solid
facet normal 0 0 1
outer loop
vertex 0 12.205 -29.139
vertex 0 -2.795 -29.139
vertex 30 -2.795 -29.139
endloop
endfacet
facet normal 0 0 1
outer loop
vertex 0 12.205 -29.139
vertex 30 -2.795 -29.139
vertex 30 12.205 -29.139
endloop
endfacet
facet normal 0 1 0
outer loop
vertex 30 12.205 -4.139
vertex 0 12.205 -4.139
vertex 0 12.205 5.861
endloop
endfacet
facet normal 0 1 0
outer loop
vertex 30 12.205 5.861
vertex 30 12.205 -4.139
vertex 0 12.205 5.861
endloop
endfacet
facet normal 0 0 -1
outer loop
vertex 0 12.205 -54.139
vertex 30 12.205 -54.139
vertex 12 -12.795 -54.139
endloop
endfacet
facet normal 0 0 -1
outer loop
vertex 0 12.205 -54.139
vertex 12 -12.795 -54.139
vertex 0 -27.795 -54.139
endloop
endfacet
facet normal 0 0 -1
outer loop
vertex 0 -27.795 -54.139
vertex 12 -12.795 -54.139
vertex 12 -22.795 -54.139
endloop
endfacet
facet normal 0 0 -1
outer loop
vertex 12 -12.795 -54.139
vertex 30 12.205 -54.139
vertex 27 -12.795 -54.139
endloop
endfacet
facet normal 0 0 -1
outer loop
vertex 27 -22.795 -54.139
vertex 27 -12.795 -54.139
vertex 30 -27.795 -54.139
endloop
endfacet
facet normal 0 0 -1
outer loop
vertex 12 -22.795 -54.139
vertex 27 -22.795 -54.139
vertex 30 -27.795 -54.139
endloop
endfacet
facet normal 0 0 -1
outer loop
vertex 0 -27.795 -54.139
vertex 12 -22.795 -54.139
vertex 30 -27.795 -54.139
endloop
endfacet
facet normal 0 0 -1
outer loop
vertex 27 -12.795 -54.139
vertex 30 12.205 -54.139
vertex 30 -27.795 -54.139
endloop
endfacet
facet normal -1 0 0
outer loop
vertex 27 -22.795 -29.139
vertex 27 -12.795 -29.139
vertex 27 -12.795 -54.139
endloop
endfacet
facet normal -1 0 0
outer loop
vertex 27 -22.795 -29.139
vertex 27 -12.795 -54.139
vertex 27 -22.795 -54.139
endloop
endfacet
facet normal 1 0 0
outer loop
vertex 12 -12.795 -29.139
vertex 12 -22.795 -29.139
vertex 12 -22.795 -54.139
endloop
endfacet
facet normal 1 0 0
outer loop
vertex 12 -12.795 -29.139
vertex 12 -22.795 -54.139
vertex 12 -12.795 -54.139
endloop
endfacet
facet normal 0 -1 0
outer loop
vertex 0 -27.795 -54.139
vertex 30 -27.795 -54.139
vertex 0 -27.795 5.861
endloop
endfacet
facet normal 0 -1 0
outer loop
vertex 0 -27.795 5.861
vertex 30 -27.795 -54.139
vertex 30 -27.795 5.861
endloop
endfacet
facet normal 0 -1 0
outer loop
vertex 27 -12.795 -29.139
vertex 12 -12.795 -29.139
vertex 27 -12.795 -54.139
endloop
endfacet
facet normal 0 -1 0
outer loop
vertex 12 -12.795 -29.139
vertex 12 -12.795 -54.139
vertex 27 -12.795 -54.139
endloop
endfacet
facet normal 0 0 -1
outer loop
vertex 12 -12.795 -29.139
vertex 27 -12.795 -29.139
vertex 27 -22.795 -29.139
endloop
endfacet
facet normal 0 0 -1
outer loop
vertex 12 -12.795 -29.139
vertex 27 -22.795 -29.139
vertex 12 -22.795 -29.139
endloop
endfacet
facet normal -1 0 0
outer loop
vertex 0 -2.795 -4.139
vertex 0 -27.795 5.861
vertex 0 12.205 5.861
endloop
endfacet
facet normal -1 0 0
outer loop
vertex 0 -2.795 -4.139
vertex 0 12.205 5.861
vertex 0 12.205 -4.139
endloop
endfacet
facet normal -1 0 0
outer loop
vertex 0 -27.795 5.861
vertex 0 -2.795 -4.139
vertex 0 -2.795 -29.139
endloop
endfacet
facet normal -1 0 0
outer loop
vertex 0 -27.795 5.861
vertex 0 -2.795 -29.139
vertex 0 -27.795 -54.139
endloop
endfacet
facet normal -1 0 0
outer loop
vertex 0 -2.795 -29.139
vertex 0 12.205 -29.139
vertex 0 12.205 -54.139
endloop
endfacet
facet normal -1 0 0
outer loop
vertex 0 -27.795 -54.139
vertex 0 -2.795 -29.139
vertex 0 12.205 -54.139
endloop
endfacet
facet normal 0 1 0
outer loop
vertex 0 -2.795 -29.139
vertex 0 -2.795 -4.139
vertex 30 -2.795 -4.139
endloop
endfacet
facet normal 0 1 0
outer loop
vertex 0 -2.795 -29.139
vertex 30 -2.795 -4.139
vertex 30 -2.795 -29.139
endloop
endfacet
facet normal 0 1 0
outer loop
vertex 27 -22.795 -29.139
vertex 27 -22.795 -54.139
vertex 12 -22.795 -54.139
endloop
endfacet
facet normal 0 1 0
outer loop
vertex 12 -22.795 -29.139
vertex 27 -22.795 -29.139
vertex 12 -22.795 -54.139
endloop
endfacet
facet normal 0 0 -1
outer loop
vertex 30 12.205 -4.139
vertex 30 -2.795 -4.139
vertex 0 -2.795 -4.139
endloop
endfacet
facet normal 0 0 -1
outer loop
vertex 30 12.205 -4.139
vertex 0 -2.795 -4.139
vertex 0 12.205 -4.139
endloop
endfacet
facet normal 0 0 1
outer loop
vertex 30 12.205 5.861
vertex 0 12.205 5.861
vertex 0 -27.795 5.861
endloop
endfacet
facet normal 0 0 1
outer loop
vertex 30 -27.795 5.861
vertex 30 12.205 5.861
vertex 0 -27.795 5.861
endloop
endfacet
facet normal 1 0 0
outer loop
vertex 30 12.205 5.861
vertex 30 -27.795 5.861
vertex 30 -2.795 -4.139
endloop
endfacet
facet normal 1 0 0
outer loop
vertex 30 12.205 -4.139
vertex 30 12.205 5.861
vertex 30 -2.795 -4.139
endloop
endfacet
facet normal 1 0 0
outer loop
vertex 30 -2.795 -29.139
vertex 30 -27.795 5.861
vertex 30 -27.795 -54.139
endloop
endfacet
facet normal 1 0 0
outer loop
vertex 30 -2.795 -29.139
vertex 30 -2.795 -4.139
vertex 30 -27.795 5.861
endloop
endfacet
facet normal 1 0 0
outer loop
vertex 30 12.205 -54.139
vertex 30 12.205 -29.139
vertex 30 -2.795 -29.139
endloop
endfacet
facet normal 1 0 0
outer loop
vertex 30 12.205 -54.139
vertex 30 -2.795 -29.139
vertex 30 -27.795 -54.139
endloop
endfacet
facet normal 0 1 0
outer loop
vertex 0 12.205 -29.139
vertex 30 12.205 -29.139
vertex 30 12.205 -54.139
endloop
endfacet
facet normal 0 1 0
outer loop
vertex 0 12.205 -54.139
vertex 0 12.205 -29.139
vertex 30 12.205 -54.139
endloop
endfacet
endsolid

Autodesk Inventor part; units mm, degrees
ref_plane "YZ Plane" through (0, 0, 0) normal (1, 0, 0) x (0, 1, 0)
ref_plane "XZ Plane" through (0, 0, 0) normal (0, 1, 0) x (-1, 0, 0)
ref_plane "XY Plane" through (0, 0, 0) normal (0, 0, 1) x (1, 0, 0)
sketch "Sketch1" plane through (0, 0, 0) normal (1, 0, 0) x (0, 1, 0)
  point P0 (0, 0)
sketch "Sketch2" plane through (0, 0, 0) normal (1, 0, 0) x (0, 1, 0)
  line L0 (12.2052, 5.8608) -> (-2.7948, 5.8608)
  line L1 (-2.7948, 5.8608) -> (-2.7948, -4.1392)
  line L2 (-2.7948, -4.1392) -> (12.2052, -4.1392)
  line L3 (12.2052, -4.1392) -> (12.2052, 5.8608)
  point P0 (0, 0)
  dimension "d0" = 15
  dimension "d1" = 10
extrude "Extrusion1" add sketch "Sketch2" along normal blind 30
sketch "Sketch3" plane through (30, 0, 0) normal (1, 0, 0) x (0, 0, -1)
  line L0 (-5.8608, -2.7948) -> (4.1392, -2.7948) projected
  line L1 (-5.8608, -2.7948) -> (54.1392, -2.7948)
  line L2 (54.1392, -2.7948) -> (54.1392, -27.7948)
  line L3 (54.1392, -27.7948) -> (-5.8608, -27.7948)
  line L4 (-5.8608, -27.7948) -> (-5.8608, -2.7948)
  point P0 (0, 0)
  dimension "d4" = 60
  dimension "d5" = 25
extrude "Extrusion2" add sketch "Sketch3" against normal blind 30
sketch "Sketch4" plane through (30, 0, 0) normal (1, 0, 0) x (0, 0, -1)
  line L0 (54.1392, -2.7948) -> (54.1392, -27.7948) projected
  line L1 (54.1392, -2.7948) -> (29.1392, -2.7948)
  line L2 (29.1392, -2.7948) -> (29.1392, 12.2052)
  line L3 (29.1392, 12.2052) -> (54.1392, 12.2052)
  line L4 (54.1392, 12.2052) -> (54.1392, -2.7948)
  point P0 (0, 0)
  dimension "d8" = 25
  dimension "d9" = 15
extrude "Extrusion3" add sketch "Sketch4" against normal blind 30
sketch "Sketch5" plane through (30, -27.7948, -54.1392) normal (0, 0, -1) x (-1, 0, 0)
  line L0 (0, 0) -> (30, 0) projected
  line L1 (0, 0) -> (0, 5)
  line L2 (0, 40) -> (0, 0) projected
  line L3 (0, 5) -> (3, 5)
  line L4 (3, 5) -> (18, 5)
  line L5 (18, 5) -> (18, 15)
  line L6 (18, 15) -> (3, 15)
  line L7 (3, 15) -> (3, 5)
  point P0 (30, 27.7948)
  dimension "d12" = 5
  dimension "d13" = 3
  dimension "d14" = 15
  dimension "d15" = 10
extrude "Extrusion4" cut sketch "Sketch5" against normal blind 25
